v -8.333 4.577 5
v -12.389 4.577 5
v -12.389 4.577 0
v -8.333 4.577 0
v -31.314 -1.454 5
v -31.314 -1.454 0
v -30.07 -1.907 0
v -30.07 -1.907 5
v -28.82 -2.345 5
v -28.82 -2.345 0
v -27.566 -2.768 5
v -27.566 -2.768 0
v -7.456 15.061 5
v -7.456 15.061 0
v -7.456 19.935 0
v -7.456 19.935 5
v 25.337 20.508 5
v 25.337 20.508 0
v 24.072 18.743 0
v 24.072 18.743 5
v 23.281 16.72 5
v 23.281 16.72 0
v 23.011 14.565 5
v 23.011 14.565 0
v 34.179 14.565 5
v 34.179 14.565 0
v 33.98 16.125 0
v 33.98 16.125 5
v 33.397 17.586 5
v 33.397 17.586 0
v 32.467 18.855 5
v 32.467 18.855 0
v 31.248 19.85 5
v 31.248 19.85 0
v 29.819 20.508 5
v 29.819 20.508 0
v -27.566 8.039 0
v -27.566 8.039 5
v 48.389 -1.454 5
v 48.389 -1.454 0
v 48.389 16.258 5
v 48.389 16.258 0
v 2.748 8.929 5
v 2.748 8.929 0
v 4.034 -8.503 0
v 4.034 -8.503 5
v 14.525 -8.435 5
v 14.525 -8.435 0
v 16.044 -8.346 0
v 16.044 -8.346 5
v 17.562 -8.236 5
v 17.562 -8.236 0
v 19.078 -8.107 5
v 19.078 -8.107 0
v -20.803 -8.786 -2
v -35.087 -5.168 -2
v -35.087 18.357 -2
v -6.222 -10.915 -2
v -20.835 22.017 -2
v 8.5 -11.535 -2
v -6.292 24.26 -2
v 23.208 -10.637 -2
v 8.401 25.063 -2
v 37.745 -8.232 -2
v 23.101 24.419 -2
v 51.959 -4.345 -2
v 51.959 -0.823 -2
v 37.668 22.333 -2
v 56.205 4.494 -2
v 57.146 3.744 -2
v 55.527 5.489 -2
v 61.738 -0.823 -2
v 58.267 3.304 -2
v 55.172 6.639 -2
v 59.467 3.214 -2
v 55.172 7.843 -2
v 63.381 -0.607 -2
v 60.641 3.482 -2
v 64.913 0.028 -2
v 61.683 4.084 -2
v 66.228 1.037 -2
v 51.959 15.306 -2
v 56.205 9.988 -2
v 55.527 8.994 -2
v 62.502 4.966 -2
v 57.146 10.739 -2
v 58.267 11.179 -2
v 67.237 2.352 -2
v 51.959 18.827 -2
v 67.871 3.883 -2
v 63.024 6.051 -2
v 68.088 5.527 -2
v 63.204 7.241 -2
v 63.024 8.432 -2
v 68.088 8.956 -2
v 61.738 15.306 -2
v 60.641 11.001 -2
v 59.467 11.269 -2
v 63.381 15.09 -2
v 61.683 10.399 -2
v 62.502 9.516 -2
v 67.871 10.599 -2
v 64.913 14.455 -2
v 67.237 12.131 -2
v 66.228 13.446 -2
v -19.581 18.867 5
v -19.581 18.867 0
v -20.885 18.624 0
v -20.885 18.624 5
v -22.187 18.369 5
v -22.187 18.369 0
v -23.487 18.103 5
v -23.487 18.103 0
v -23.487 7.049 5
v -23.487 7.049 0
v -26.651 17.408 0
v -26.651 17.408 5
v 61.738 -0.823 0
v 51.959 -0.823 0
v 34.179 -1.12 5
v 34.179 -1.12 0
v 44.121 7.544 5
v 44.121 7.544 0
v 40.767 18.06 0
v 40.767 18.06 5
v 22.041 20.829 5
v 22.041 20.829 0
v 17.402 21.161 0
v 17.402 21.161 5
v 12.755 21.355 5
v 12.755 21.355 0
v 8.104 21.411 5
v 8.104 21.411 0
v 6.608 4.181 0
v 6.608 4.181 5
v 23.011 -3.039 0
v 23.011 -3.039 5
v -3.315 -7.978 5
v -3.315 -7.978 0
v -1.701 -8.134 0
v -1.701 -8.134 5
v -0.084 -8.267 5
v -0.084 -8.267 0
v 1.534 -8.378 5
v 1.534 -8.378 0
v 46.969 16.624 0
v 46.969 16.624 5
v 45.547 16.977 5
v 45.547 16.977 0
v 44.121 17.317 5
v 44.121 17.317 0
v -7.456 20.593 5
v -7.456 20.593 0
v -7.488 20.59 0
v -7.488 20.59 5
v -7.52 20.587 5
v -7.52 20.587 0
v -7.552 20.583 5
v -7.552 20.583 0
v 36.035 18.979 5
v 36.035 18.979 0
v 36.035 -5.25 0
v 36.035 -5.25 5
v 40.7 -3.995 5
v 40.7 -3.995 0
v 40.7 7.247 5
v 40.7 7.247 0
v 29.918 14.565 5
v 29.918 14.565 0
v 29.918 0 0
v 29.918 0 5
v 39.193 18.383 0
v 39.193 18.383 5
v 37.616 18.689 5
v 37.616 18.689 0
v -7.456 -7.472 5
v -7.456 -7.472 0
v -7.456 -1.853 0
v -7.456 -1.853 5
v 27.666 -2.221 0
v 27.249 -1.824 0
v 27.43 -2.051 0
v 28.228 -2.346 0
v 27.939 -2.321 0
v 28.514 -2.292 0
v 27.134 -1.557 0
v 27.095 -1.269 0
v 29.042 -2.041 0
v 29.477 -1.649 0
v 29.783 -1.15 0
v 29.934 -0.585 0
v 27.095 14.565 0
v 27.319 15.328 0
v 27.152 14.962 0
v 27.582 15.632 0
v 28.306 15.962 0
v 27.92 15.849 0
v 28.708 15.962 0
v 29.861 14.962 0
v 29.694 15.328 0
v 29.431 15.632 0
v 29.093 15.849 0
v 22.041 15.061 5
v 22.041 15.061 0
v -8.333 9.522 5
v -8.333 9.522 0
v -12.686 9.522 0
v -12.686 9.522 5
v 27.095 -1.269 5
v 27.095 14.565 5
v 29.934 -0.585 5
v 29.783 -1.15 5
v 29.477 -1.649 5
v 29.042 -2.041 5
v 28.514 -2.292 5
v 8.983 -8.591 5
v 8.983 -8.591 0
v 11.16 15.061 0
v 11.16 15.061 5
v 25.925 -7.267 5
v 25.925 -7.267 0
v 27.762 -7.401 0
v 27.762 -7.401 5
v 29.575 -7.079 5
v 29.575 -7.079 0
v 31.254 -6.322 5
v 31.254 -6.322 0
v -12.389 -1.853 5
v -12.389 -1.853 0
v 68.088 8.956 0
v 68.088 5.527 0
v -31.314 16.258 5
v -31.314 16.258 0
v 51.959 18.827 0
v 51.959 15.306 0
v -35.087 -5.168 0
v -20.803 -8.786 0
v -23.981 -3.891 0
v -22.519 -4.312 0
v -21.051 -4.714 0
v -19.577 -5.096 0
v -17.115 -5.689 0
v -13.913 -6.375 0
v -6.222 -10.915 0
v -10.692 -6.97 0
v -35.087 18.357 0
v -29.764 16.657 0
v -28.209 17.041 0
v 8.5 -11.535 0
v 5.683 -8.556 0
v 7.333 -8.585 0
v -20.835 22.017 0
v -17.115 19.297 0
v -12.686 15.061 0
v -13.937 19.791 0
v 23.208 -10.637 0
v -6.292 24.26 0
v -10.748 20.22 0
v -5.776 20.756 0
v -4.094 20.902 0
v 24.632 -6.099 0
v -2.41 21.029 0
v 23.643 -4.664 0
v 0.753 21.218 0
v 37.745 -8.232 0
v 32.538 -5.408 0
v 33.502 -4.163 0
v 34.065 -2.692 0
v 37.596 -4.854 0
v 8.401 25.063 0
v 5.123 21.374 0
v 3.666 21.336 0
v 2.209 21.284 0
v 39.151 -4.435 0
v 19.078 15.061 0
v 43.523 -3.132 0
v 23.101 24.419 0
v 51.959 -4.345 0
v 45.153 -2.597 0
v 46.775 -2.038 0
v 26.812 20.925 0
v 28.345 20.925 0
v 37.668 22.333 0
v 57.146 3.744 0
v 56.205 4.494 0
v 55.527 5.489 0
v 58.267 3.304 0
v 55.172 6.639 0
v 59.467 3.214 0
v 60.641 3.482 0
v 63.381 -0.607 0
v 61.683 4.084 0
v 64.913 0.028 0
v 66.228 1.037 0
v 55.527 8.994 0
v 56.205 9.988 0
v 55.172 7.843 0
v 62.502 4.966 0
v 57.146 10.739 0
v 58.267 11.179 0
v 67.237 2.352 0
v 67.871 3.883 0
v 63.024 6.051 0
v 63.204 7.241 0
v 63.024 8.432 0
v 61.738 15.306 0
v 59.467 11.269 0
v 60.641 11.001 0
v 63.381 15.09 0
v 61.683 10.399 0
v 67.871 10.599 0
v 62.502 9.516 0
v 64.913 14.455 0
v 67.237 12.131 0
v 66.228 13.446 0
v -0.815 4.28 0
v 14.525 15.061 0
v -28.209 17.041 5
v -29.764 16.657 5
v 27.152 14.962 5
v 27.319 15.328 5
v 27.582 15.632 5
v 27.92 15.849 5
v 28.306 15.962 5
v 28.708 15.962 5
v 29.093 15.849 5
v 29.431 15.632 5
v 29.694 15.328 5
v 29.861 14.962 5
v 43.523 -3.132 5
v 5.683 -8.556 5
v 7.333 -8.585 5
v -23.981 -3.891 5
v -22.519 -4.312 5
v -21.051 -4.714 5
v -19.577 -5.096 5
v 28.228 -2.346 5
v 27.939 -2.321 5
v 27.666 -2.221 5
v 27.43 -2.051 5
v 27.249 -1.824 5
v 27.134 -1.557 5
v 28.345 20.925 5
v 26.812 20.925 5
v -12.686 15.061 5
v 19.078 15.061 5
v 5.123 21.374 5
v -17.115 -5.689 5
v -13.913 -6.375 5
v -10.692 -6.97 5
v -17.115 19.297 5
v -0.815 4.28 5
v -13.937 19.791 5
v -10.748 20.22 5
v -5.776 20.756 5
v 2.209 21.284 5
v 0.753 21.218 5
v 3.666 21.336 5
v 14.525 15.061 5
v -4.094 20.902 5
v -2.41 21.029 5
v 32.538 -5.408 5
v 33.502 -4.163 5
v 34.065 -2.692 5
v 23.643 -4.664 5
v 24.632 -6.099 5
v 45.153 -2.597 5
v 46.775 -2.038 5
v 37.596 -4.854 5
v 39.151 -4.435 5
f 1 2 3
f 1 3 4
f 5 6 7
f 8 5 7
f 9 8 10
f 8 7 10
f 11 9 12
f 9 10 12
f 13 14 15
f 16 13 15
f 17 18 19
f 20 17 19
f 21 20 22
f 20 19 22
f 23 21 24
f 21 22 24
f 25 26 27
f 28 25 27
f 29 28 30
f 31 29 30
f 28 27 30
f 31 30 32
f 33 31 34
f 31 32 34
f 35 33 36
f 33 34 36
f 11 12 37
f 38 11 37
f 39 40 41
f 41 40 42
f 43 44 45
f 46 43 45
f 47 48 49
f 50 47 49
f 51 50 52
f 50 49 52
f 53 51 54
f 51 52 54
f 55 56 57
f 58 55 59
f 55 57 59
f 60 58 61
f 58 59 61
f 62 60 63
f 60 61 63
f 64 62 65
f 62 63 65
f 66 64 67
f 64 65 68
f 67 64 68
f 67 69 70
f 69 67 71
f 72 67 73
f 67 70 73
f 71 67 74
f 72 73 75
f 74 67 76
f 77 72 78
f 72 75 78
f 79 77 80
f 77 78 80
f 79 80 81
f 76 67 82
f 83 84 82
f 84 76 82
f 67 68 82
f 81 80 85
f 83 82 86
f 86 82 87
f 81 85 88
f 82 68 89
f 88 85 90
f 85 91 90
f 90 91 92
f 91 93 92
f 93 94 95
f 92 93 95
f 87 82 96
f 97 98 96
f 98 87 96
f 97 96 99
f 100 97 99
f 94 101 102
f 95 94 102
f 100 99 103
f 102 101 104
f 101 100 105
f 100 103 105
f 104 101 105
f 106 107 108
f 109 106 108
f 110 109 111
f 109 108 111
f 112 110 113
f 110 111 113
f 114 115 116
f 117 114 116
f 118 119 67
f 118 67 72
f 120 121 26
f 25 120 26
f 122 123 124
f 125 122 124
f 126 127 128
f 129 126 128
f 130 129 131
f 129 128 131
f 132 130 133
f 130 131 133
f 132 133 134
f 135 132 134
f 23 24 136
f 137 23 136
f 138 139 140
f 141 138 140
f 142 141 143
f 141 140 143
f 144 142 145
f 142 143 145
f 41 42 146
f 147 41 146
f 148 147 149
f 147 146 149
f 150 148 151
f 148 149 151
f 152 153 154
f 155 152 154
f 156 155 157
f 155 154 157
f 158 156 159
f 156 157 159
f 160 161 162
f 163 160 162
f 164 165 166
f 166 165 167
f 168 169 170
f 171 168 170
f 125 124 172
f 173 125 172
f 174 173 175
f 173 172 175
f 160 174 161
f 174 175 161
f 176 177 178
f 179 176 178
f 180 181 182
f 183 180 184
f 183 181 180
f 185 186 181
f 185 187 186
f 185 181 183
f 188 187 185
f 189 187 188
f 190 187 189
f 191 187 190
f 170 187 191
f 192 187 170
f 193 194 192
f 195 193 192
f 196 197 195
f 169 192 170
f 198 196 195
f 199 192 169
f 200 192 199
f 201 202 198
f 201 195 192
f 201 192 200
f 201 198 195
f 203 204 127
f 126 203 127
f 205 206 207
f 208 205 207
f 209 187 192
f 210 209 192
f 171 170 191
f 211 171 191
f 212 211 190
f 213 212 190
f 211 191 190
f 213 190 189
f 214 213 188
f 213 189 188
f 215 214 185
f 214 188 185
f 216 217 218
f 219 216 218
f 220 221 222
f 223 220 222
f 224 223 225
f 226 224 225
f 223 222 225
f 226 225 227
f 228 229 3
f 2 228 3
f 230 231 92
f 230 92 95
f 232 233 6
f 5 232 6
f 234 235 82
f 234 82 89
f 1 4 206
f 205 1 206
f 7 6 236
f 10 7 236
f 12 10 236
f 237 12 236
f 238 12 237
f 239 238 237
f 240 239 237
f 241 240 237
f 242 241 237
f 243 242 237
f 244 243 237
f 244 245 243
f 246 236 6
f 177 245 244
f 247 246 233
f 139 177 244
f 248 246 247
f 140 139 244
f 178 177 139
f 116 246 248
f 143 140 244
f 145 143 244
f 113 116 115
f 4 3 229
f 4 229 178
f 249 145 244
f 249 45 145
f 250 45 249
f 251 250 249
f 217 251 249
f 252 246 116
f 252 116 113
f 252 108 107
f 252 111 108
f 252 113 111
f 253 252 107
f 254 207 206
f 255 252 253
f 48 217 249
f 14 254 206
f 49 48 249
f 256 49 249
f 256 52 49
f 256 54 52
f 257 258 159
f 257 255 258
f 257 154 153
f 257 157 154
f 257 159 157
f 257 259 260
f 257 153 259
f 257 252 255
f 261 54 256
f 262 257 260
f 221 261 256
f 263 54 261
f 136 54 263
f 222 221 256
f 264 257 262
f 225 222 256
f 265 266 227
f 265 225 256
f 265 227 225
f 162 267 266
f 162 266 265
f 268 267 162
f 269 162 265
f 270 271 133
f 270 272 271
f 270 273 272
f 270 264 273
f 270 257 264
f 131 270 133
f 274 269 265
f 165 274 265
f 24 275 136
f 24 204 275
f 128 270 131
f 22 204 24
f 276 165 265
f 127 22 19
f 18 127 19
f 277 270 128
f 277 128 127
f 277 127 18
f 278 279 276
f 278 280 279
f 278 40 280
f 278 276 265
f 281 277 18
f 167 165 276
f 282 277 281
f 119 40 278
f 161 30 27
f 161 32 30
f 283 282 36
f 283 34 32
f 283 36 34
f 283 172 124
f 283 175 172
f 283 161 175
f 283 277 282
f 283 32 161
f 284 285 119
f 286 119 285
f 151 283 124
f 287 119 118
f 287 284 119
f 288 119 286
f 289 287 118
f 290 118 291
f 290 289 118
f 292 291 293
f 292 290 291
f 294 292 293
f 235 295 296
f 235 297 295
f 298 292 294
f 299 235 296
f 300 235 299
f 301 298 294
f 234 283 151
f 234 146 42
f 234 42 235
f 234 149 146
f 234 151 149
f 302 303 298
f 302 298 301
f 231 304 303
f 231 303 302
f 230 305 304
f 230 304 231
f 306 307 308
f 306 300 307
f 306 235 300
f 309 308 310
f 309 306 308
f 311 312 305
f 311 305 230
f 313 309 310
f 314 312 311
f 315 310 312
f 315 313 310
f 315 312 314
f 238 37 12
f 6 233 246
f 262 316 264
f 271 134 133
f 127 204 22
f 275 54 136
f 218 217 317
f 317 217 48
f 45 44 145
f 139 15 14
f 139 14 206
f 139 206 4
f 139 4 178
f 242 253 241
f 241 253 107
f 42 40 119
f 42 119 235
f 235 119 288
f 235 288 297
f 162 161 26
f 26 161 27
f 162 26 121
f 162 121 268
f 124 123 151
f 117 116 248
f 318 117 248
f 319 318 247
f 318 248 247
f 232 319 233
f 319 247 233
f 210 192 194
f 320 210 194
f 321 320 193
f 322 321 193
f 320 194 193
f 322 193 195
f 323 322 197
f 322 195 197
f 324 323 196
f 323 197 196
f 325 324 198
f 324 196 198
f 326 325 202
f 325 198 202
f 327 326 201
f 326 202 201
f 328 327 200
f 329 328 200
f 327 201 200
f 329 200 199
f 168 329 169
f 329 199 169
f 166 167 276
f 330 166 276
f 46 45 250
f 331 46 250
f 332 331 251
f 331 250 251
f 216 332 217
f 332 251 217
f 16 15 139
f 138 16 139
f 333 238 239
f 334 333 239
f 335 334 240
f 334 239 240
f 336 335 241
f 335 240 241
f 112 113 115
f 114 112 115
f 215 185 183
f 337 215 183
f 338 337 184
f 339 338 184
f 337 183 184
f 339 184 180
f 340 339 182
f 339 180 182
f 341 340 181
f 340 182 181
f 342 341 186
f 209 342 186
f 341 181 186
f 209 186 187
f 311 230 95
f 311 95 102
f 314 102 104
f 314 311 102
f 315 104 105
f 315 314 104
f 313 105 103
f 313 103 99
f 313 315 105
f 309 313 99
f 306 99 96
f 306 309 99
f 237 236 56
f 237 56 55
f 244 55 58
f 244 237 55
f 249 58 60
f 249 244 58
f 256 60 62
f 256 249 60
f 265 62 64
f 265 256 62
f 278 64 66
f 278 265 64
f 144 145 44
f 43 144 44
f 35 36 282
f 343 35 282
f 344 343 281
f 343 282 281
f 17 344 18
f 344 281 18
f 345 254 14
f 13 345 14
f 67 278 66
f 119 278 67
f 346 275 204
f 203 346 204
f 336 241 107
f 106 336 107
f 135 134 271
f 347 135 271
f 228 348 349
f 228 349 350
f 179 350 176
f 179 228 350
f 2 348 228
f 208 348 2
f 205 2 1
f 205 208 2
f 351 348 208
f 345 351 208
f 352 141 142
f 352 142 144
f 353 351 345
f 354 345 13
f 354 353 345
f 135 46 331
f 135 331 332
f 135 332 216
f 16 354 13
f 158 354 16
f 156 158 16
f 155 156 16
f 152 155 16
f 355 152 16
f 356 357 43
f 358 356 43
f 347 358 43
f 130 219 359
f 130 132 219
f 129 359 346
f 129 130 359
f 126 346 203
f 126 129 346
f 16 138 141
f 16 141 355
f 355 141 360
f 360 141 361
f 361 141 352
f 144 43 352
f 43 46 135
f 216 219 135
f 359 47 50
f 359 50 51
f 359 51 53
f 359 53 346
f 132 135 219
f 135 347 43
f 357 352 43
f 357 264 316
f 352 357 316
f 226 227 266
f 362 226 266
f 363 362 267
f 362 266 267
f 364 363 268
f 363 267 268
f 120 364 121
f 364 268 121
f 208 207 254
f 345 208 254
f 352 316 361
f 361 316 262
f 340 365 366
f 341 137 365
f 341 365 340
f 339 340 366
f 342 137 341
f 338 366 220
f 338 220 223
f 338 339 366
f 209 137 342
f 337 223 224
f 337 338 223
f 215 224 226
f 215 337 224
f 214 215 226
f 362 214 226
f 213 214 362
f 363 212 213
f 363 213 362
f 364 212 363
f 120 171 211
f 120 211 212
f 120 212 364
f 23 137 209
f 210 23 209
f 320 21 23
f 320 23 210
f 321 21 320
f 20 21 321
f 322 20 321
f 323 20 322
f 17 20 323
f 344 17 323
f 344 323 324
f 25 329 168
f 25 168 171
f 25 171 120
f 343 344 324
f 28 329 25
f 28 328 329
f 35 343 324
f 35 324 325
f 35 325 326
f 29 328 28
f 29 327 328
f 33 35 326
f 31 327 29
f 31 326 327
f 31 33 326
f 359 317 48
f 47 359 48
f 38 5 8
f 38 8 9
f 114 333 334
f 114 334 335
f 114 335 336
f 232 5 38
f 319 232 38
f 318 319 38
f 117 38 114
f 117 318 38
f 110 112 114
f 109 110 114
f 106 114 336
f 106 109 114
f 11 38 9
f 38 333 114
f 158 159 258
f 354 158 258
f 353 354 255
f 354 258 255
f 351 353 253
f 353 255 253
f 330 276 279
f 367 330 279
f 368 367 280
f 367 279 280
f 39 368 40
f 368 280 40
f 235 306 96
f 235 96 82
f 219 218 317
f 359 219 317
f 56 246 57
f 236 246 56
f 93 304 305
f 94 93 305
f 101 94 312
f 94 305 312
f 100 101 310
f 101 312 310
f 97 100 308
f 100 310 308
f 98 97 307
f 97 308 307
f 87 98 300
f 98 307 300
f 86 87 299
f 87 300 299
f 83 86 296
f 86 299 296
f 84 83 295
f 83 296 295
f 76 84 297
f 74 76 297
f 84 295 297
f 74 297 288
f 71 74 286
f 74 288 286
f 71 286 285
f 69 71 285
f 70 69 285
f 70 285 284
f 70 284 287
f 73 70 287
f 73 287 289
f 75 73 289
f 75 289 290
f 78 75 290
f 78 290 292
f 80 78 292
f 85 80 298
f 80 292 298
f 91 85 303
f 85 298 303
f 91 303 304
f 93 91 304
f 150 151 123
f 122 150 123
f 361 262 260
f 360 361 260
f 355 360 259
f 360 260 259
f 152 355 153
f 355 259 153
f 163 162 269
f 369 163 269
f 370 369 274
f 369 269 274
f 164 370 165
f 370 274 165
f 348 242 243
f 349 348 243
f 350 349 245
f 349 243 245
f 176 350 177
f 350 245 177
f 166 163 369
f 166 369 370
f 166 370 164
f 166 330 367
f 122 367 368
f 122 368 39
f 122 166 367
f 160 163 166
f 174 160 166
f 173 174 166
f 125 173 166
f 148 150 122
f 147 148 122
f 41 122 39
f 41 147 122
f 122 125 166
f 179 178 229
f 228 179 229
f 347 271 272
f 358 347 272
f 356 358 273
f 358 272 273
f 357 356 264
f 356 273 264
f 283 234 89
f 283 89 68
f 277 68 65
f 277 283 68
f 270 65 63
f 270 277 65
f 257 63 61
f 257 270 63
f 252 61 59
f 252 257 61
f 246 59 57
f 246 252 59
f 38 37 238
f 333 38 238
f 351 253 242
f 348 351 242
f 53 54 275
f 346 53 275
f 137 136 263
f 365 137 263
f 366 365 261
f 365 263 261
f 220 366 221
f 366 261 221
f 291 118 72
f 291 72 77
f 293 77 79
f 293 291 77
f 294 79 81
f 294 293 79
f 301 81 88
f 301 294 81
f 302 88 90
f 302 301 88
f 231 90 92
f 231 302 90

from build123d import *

# Parameters (mm, degrees)
F1_DEPTH = 5
F3_DEPTH = 2
F5_R     = 4.0386
F6_DEPTH = 2


with BuildPart() as f1:
    # F0 (on Top) → F1 (new body)
    with BuildSketch(Plane.XY):
        with BuildLine():
            ThreePointArc((-26.651348, 17.408332), (-28.98701, 16.85103), (-31.313855, 16.257994))
            Line((-31.313855, 16.257994), (-31.313855, -1.454417))
            ThreePointArc((-31.313855, -1.454417), (-29.445548, -2.127472), (-27.565881, -2.768118))
            Line((-27.565881, -2.768118), (-27.565881, 8.0386))
            Line((-27.565881, 8.0386), (-23.981268, -3.890644))
            ThreePointArc((-23.981268, -3.890644), (-21.785328, -4.515397), (-19.577401, -5.096367))
            Line((-19.577401, -5.096367), (-19.580996, 18.867471))
            ThreePointArc((-19.580996, 18.867471), (-21.536505, 18.497823), (-23.48716, 18.103362))
            Line((-23.48716, 18.103362), (-23.48716, 7.049417))
            Line((-23.48716, 7.049417), (-26.651348, 17.408332))
        make_face()
        with BuildLine():
            Line((48.388597, -1.454417), (48.388597, 16.257994))
            ThreePointArc((48.388597, 16.257994), (46.258605, 16.802327), (44.121183, 17.316716))
            Line((44.121183, 17.316716), (44.121183, 7.543997))
            Line((44.121183, 7.543997), (40.767098, 18.060365))
            ThreePointArc((40.767098, 18.060365), (38.40477, 18.538069), (36.035373, 18.979372))
            Line((36.035373, 18.979372), (36.035373, -5.250303))
            ThreePointArc((36.035373, -5.250303), (38.374392, -4.647226), (40.700207, -3.995081))
            Line((40.700207, -3.995081), (40.700207, 7.247278))
            Line((40.700207, 7.247278), (43.522989, -3.131948))
            ThreePointArc((43.522989, -3.131948), (45.965192, -2.320446), (48.388597, -1.454417))
        make_face()
        with BuildLine():
            ThreePointArc((-7.551971, 20.583244), (-12.343521, 20.013793), (-17.11526, 19.297039))
            Line((-17.11526, 19.297039), (-17.11526, -5.68932))
            ThreePointArc((-17.11526, -5.68932), (-12.30462, -6.684076), (-7.455836, -7.472168))
            Line((-7.455836, -7.472168), (-7.455836, -1.852502))
            Line((-7.455836, -1.852502), (-12.389002, -1.852502))
            Line((-12.389002, -1.852502), (-12.389002, 4.576681))
            Line((-12.389002, 4.576681), (-8.332584, 4.576681))
            Line((-8.332584, 4.576681), (-8.332584, 9.522207))
            Line((-8.332584, 9.522207), (-12.685815, 9.522207))
            Line((-12.685815, 9.522207), (-12.685815, 15.061192))
            Line((-12.685815, 15.061192), (-7.455836, 15.061192))
            Line((-7.455836, 15.061192), (-7.455836, 19.935173))
            Line((-7.455836, 19.935173), (-7.551971, 20.583244))
        make_face()
        with BuildLine():
            ThreePointArc((-7.455836, 20.59314), (-7.503905, 20.5882), (-7.551971, 20.583244))
            Line((-7.551971, 20.583244), (-7.455836, 19.935173))
            Line((-7.455836, 19.935173), (-7.455836, 20.59314))
        make_face()
        with BuildLine():
            Line((-7.455836, 20.59314), (-7.455836, 19.935173))
            Line((-7.455836, 19.935173), (-3.31518, -7.978035))
            ThreePointArc((-3.31518, -7.978035), (-0.89273, -8.203509), (1.533954, -8.377611))
            Line((1.533954, -8.377611), (2.747888, 8.928744))
            Line((2.747888, 8.928744), (4.034133, -8.503044))
            ThreePointArc((4.034133, -8.503044), (6.507916, -8.573444), (8.982641, -8.590516))
            Line((8.982641, -8.590516), (11.160356, 15.061197))
            Line((11.160356, 15.061197), (14.525345, 15.061197))
            Line((14.525345, 15.061197), (14.525345, -8.435146))
            ThreePointArc((14.525345, -8.435146), (16.803292, -8.293483), (19.077973, -8.106573))
            Line((19.077973, -8.106573), (19.077973, 15.061197))
            Line((19.077973, 15.061197), (22.041207, 15.061197))
            Line((22.041207, 15.061197), (22.041207, 20.828562))
            ThreePointArc((22.041207, 20.828562), (15.07889, 21.275037), (8.103599, 21.411077))
            Line((8.103599, 21.411077), (6.607726, 4.181039))
            Line((6.607726, 4.181039), (5.123083, 21.374465))
            ThreePointArc((5.123083, 21.374465), (2.93767, 21.311562), (0.753347, 21.218165))
            Line((0.753347, 21.218165), (-0.815041, 4.27995))
            Line((-0.815041, 4.27995), (-2.410396, 21.028664))
            ThreePointArc((-2.410396, 21.028664), (-4.934876, 20.831292), (-7.455836, 20.59314))
        make_face()
        with BuildLine():
            ThreePointArc((25.337448, 20.50822), (23.613483, 17.75595), (23.011211, 14.564663))
            Line((23.011211, 14.564663), (23.011211, -3.039429))
            ThreePointArc((23.011211, -3.039429), (24.095706, -5.410003), (25.924952, -7.267315))
            ThreePointArc((25.924952, -7.267315), (28.678591, -7.296316), (31.254217, -6.321887))
            ThreePointArc((31.254217, -6.321887), (33.502257, -4.16289), (34.178704, -1.120298))
            Line((34.178704, -1.120298), (34.178704, 14.564663))
            ThreePointArc((34.178704, 14.564663), (32.97203, 18.250105), (29.81934, 20.50822))
            ThreePointArc((29.81934, 20.50822), (27.578394, 20.977344), (25.337448, 20.50822))
        make_face()
        with BuildLine():
            Line((27.094735, -1.268663), (27.094735, 14.564663))
            ThreePointArc((27.094735, 14.564663), (28.506575, 15.976503), (29.918415, 14.564663))
            Line((29.918415, 14.564663), (29.918415, 0))
            ThreePointArc((29.918415, 0), (29.647931, -1.410752), (28.513743, -2.292226))
            ThreePointArc((28.513743, -2.292226), (27.542368, -2.143487), (27.094735, -1.268663))
        make_face(mode=Mode.SUBTRACT)
    extrude(amount=F1_DEPTH)


with BuildPart() as f3:
    # F2 (on Top) → F3 (new body)
    with BuildSketch(Plane.XY):
        with BuildLine():
            ThreePointArc((51.958822, 18.827472), (8.400722, 25.06269), (-35.087429, 18.356971))
            Line((-35.087429, 18.356971), (-35.087429, -5.168048))
            ThreePointArc((-35.087429, -5.168048), (8.499812, -11.534627), (51.958822, -4.344672))
            Line((51.958822, -4.344672), (51.958822, 18.827472))
        make_face()
    extrude(amount=-F3_DEPTH)


with BuildPart() as f1_1:
    add(f1.part)

    # F4: union F3
    add(f3.part)

    # F5 (on face) → F6 (join)
    with BuildSketch(Plane.XY):
        with BuildLine():
            Line((51.958822, 15.3059), (51.958822, 7.2414))
            Line((51.958822, 7.2414), (51.958822, -0.8231))
            Line((51.958822, -0.8231), (61.737822, -0.8231))
            ThreePointArc((61.737822, -0.8231), (66.22795, 1.036772), (68.087822, 5.5269))
            Line((68.087822, 5.5269), (68.087822, 8.9559))
            ThreePointArc((68.087822, 8.9559), (66.22795, 13.446028), (61.737822, 15.3059))
            Line((61.737822, 15.3059), (51.958822, 15.3059))
        make_face()
        with Locations((59.165195, 7.2414)):
            Circle(F5_R, mode=Mode.SUBTRACT)
    extrude(amount=-F6_DEPTH)


solid = f1_1.part
